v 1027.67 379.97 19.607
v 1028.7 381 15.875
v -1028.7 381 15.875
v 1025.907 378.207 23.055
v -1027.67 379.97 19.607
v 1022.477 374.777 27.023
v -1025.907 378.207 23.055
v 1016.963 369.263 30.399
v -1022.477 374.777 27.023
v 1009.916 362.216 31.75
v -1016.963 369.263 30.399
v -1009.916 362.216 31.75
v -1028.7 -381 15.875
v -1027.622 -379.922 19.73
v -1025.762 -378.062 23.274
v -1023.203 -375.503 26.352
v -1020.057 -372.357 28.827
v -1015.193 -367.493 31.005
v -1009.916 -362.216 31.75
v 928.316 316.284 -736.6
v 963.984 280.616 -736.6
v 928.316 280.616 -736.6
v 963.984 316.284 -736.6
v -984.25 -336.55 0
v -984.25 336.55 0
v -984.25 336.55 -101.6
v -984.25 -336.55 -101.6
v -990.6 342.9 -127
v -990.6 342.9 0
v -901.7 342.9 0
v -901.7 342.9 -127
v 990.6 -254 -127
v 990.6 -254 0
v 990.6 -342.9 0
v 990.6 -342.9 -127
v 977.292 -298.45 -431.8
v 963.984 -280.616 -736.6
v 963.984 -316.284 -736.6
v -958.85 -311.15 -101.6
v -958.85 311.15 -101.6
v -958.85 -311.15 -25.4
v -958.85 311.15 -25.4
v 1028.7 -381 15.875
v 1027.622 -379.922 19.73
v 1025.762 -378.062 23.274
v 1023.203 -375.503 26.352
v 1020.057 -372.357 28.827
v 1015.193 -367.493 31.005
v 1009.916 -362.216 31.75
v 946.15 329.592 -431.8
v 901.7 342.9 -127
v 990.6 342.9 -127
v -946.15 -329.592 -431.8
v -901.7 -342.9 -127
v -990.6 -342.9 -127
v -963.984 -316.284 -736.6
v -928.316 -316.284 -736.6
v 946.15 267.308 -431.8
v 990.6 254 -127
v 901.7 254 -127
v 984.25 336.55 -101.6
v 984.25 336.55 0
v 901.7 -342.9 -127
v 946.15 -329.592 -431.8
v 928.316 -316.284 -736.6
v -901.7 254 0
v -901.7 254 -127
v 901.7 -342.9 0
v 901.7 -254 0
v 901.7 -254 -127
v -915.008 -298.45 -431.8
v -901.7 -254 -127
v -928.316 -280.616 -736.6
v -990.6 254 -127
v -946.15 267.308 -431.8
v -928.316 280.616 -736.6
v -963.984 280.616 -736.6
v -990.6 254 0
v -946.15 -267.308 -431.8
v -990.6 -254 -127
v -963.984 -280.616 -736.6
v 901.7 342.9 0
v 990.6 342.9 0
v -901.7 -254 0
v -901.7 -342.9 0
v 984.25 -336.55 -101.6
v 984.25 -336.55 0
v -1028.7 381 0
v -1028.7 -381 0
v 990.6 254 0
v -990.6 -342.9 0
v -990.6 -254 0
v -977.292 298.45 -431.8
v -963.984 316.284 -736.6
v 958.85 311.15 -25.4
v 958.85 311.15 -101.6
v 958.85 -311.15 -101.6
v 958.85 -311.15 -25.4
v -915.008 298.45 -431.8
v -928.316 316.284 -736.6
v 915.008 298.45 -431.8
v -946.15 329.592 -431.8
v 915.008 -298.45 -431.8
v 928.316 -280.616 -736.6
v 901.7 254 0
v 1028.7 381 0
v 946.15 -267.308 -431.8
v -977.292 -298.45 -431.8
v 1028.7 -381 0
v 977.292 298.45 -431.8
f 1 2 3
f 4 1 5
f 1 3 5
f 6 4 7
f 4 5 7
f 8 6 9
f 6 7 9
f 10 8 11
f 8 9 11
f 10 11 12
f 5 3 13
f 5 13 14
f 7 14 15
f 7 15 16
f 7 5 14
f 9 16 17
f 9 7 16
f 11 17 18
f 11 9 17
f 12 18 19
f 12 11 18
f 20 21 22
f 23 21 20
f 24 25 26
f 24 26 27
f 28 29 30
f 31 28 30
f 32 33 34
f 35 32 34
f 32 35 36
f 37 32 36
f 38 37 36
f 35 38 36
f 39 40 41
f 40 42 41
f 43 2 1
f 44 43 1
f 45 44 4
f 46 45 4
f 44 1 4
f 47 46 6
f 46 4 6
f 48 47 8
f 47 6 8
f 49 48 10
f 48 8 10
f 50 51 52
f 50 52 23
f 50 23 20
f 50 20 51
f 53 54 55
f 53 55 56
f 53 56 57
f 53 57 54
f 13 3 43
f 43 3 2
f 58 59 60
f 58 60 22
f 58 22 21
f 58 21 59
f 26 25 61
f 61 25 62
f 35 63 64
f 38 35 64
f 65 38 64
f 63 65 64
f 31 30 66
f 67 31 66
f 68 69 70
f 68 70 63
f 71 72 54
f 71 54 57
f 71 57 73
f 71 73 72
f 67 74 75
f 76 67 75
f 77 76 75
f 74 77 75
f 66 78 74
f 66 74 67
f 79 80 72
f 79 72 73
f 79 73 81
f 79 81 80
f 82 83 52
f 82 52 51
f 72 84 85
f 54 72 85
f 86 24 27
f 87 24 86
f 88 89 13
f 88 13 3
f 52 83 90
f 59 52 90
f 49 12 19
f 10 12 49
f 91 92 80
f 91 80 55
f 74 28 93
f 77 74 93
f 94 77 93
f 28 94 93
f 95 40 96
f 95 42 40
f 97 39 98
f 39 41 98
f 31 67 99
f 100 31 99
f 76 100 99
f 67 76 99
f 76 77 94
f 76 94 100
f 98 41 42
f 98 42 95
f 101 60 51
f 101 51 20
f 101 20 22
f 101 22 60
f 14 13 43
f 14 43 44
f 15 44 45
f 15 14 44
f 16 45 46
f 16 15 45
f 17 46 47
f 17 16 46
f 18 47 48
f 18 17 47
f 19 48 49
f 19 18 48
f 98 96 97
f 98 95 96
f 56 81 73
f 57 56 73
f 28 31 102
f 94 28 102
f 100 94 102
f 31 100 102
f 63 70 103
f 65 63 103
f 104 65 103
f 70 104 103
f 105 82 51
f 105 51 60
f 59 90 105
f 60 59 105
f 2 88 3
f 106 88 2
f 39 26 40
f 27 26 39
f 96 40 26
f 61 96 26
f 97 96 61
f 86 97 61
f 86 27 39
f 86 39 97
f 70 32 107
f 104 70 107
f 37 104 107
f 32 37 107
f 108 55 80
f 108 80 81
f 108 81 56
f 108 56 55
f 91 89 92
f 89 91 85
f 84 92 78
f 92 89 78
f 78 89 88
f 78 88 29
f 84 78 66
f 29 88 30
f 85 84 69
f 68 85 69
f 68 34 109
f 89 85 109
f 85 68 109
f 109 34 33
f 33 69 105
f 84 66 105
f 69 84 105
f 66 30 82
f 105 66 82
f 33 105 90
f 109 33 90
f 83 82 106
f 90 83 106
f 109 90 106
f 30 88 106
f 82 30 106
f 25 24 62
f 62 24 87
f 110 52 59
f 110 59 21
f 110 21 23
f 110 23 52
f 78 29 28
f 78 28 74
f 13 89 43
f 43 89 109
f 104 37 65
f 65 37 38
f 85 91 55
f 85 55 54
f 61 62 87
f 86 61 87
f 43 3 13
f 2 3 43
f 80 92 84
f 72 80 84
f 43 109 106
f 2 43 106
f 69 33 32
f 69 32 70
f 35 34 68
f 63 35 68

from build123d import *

# Parameters (mm, degrees)
F0_W        = 2057.4
F0_H        = 762
F1_DEPTH    = 15.875
F2_W        = 2057.4
F2_H        = 762
F3_DEPTH    = 15.875
F4_T1_DEPTH = 2151.3177665567
F4_T3_DEPTH = 855.9177665567
F6_W        = 88.9
F6_H        = 88.9
F7_DEPTH    = 127
F9_W        = 1968.5
F9_H        = 673.1
F10_DEPTH   = 101.6
F11_T       = -25.4
F12_W       = 88.9
F12_H       = 88.9
F13_DEPTH   = 609.6
F13_TAPER   = 2.5


# Not quite as in the source:
# - a fillet or chamfer that OpenCascade refuses, or shapes differently, is made with other operations: its cross-section is extruded or revolved along the edge and cut away or added


with BuildPart() as f1:
    # F0 (on Top) → F1 (new body)
    with BuildSketch(Plane.XY):
        Rectangle(F0_W, F0_H)
    extrude(amount=F1_DEPTH)

    # F6 (on face) → F7 (join)
    with BuildSketch(Plane(origin=(0, 0, 0), x_dir=(1, 0, 0), z_dir=(0, 0, -1))):
        with Locations((-946.15, 298.45)):
            Rectangle(F6_W, F6_H)
        with Locations((-946.15, -298.45)):
            Rectangle(F6_W, F6_H)
    extrude(amount=F7_DEPTH)

    # F8: F1 across plane


with BuildPart() as f3:
    # F2 (on face) → F3 (new body)
    with BuildSketch(Plane.XY.offset(15.875)):
        Rectangle(F2_W, F2_H)
    extrude(amount=F3_DEPTH)

    # F4: fillet of radius 19.05 on 4 edges, made by hand

    # F4_s2 → F4_t1 (cut)
    with BuildSketch(Plane.YZ.offset(-1075.6588832784)):
        with BuildLine():
            ThreePointArc((-381, 15.875), (-374.5131688129, 27.2496778315), (-362.2164466887, 31.75))
            Line((-362.2164466887, 31.75), (-381, 31.75))
            Line((-381, 31.75), (-381, 15.875))
        make_face()
        with BuildLine():
            ThreePointArc((381, 15.875), (374.5131688129, 27.2496778315), (362.2164466887, 31.75))
            Line((362.2164466887, 31.75), (381, 31.75))
            Line((381, 31.75), (381, 15.875))
        make_face()
    extrude(amount=F4_T1_DEPTH, mode=Mode.SUBTRACT)

    # F4_s4 → F4_t3 (cut)
    with BuildSketch(Plane.XZ.offset(-427.9588832784)):
        with BuildLine():
            ThreePointArc((-1028.7, 15.875), (-1022.2131688129, 27.2496778315), (-1009.9164466887, 31.75))
            Line((-1009.9164466887, 31.75), (-1028.7, 31.75))
            Line((-1028.7, 31.75), (-1028.7, 15.875))
        make_face()
        with BuildLine():
            ThreePointArc((1028.7, 15.875), (1022.2131688129, 27.2496778315), (1009.9164466887, 31.75))
            Line((1009.9164466887, 31.75), (1028.7, 31.75))
            Line((1028.7, 31.75), (1028.7, 15.875))
        make_face()
    extrude(amount=F4_T3_DEPTH, mode=Mode.SUBTRACT)


with BuildPart() as f1_1:
    add(f1.part)
    add(f1.part.mirror(Plane.YZ))

    # F12 (on face) → F13 (join)
    with BuildSketch(Plane(origin=(0, 0, -127), x_dir=(1, 0, 0), z_dir=(0, 0, -1))):
        with Locations((-946.15, 298.45)):
            Rectangle(F12_W, F12_H)
    extrude(amount=F13_DEPTH, taper=F13_TAPER)


with BuildPart() as f10:
    # F9 (on face) → F10 (new body)
    with BuildSketch(Plane(origin=(0, 0, 0), x_dir=(1, 0, 0), z_dir=(0, 0, -1))):
        Rectangle(F9_W, F9_H)
    extrude(amount=F10_DEPTH)

    # F11
    f11_openings = [f10.faces().sort_by_distance(p)[0] for p in [
        (0, 0, -101.6),
    ]]
    offset(amount=F11_T, openings=f11_openings)


with BuildPart() as f14_1:
    # F14: instance of F1
    add(f1_1.part.mirror(Plane.XZ))


with BuildPart() as f1_2:
    add(f1_1.part)

    add(f14_1.part)  # F15 merges F14_1
    # F15: F1, F14_1 across plane
    add(f1_1.part.mirror(Plane.YZ))
    add(f14_1.part.mirror(Plane.YZ))


solid = Compound([f3.part, f10.part, f1_2.part])
